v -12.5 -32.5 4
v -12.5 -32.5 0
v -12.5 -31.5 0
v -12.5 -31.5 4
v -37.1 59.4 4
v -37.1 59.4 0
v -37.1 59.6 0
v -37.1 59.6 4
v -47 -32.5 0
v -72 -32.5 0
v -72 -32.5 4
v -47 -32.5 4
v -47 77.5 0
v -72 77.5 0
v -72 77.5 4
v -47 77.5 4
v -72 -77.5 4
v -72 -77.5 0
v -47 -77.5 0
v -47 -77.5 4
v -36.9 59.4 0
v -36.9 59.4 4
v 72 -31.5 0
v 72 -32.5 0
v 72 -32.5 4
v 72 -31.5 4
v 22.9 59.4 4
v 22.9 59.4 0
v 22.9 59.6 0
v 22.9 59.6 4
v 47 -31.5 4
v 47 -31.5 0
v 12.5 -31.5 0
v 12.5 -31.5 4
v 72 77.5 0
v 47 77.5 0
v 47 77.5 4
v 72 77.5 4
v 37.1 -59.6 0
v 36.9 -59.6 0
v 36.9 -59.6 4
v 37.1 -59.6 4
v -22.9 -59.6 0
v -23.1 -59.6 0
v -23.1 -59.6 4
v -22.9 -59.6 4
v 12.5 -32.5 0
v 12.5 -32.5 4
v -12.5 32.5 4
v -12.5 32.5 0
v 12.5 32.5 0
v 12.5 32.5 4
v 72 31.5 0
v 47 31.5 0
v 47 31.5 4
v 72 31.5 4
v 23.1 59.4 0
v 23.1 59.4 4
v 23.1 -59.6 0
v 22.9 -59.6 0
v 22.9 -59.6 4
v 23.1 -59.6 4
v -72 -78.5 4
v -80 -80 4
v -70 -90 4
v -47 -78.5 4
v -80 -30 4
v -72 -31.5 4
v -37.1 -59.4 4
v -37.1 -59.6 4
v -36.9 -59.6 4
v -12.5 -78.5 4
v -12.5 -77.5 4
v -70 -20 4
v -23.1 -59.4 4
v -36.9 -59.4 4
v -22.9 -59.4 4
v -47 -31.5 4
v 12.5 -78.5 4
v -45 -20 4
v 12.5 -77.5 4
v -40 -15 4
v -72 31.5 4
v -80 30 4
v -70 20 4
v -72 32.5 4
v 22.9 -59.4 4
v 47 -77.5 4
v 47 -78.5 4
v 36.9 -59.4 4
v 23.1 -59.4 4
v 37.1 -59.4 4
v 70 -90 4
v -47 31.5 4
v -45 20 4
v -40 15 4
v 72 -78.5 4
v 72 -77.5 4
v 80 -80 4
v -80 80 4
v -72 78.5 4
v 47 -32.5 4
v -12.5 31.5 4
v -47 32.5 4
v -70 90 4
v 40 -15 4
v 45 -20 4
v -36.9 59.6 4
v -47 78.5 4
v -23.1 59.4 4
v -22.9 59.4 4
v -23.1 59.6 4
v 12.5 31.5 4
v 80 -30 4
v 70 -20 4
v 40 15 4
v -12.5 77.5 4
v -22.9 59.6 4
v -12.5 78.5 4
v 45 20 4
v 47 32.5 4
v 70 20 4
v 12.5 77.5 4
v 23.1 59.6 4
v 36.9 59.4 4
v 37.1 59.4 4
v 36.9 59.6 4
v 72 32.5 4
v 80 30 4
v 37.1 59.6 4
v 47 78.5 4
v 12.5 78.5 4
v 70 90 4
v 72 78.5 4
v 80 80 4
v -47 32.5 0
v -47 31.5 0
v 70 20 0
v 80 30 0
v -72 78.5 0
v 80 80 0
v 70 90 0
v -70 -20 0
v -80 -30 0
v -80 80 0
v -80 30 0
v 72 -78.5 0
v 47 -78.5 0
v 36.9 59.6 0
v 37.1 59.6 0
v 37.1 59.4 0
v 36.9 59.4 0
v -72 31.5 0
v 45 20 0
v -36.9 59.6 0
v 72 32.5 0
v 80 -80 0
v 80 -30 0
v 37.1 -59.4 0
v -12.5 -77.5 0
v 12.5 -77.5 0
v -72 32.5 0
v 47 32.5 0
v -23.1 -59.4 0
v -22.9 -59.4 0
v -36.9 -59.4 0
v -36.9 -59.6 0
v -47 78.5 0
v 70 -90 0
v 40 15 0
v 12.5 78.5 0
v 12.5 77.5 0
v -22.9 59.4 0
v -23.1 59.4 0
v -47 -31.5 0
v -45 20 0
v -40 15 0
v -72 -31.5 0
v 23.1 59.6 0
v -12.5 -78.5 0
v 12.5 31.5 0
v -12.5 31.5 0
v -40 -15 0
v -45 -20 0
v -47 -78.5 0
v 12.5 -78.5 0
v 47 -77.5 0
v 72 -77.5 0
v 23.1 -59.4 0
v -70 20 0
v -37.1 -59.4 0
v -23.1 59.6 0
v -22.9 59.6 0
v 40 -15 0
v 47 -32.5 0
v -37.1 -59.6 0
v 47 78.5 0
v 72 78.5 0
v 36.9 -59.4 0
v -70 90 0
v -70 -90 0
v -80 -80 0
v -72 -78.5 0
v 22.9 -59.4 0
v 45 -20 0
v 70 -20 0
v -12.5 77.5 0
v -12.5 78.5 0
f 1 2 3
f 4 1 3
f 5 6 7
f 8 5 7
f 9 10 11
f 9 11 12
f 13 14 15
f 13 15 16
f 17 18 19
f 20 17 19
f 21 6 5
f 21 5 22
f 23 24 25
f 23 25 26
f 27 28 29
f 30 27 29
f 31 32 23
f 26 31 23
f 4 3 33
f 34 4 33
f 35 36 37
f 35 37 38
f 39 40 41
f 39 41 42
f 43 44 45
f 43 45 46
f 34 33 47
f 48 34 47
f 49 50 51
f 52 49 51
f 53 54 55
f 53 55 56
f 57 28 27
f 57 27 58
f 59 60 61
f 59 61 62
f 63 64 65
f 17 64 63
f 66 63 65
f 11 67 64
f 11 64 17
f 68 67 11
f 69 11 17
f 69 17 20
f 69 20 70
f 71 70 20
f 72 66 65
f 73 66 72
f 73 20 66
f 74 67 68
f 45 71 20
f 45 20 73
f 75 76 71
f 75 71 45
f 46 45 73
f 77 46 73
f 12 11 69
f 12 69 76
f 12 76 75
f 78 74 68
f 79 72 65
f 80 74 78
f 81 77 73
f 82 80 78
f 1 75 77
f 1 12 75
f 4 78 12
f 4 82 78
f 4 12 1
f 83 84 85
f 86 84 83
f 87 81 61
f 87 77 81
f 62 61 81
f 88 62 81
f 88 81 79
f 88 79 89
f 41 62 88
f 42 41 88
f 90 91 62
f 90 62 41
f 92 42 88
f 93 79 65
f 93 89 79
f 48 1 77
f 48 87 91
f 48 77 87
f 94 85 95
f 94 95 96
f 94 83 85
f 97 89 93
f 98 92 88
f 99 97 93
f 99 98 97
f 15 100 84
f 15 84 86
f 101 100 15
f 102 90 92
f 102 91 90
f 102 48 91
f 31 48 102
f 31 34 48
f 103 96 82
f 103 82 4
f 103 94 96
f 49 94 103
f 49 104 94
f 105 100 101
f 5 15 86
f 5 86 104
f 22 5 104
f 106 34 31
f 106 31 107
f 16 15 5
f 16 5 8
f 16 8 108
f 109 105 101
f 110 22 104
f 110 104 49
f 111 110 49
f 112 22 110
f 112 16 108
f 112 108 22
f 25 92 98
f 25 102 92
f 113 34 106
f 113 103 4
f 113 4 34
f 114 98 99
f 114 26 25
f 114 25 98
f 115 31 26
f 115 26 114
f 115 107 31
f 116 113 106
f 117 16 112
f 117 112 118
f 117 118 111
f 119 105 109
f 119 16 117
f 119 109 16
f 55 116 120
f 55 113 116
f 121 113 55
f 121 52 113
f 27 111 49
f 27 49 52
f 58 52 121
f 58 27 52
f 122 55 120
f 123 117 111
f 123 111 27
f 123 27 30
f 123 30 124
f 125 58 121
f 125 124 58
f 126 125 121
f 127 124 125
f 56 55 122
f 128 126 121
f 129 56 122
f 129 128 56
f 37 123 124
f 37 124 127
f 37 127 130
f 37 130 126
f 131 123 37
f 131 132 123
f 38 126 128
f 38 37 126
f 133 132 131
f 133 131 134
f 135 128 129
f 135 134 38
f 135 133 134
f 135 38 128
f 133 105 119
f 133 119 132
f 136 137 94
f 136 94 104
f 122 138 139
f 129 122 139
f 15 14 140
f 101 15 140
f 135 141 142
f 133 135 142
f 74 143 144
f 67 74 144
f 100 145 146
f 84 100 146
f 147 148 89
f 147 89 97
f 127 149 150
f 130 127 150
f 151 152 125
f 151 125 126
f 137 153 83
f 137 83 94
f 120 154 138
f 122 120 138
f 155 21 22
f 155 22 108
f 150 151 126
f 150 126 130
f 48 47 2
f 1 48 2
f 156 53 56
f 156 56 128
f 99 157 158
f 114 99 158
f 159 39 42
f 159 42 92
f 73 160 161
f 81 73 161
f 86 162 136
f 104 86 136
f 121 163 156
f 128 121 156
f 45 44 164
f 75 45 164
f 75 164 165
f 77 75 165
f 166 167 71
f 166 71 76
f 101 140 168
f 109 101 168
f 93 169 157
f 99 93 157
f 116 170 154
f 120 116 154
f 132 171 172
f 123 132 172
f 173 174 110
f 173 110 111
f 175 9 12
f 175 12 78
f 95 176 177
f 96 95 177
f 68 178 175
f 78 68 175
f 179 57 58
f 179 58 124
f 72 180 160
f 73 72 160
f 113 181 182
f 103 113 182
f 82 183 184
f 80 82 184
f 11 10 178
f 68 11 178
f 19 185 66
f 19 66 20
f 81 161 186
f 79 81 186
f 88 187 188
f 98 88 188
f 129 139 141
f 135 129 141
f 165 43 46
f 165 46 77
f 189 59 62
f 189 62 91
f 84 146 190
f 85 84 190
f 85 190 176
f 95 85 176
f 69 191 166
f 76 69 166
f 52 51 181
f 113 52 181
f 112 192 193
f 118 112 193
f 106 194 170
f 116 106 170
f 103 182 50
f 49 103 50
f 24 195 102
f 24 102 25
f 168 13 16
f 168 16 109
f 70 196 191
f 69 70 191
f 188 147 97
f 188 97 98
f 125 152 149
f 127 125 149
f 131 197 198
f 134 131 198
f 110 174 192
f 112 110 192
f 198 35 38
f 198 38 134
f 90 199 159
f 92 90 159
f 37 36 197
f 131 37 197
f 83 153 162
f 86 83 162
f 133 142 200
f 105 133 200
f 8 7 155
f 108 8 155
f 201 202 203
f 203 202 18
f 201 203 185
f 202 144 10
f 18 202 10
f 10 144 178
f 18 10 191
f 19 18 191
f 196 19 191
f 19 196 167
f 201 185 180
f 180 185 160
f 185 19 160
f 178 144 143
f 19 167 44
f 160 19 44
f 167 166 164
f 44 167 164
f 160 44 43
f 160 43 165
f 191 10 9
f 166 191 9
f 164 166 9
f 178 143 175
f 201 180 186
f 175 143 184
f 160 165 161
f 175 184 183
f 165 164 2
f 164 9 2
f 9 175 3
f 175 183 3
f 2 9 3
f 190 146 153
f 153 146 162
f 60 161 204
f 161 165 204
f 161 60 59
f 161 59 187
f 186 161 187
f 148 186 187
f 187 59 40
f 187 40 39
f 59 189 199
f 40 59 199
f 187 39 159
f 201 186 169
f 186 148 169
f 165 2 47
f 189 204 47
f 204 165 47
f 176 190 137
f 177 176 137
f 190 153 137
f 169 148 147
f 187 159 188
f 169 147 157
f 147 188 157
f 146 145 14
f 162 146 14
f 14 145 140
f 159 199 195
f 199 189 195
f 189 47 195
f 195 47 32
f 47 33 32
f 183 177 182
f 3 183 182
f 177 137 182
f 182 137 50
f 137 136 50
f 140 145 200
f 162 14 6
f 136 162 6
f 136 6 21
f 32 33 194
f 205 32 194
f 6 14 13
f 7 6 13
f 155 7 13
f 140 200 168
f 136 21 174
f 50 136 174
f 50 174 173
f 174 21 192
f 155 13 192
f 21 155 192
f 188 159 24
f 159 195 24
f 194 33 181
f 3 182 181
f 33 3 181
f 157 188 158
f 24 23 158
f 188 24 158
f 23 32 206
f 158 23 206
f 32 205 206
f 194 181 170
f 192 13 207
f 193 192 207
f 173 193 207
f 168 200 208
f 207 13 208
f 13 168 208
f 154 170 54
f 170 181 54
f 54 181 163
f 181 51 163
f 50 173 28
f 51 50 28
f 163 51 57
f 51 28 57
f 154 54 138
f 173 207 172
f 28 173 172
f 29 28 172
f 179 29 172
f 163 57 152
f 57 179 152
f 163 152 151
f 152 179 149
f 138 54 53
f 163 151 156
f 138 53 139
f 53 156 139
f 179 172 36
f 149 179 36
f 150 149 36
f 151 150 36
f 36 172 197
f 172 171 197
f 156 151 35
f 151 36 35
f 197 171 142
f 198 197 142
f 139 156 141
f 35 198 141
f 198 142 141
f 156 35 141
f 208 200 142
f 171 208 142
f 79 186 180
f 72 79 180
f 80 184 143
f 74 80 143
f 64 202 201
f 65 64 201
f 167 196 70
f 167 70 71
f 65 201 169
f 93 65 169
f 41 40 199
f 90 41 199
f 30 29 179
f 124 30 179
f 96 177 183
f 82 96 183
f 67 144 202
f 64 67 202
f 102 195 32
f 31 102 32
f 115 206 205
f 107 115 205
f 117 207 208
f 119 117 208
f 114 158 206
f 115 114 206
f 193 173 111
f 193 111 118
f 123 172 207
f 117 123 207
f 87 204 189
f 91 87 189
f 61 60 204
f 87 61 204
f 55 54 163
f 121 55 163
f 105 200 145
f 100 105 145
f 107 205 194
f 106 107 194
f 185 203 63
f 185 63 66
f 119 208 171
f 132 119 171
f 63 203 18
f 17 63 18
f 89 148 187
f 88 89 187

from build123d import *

# Parameters (mm, degrees)
F0_W     = 25
F0_H     = 1
F0_W_2   = 0.2
F0_H_2   = 0.2
F1_DEPTH = 4


with BuildPart() as f1:
    # F0 (on Top) → F1 (new body)
    with BuildSketch(Plane.XY):
        Polygon((70, 90), (0, 90), (-70, 90), (-80, 80), (-80, 30), (-70, 20), (-45, 20), (-40, 15), (-40, 0), (-40, -15), (-45, -20), (-70, -20), (-80, -30), (-80, -80), (-70, -90), (0, -90), (70, -90), (80, -80), (80, -30), (70, -20), (45, -20), (40, -15), (40, 0), (40, 15), (45, 20), (70, 20), (80, 30), (80, 80), align=None)
        with Locations((-59.5, -78)):
            Rectangle(F0_W, F0_H, mode=Mode.SUBTRACT)
        with Locations((-37, -59.5)):
            Rectangle(F0_W_2, F0_H_2, mode=Mode.SUBTRACT)
        with Locations((-23, -59.5)):
            Rectangle(F0_W_2, F0_H_2, mode=Mode.SUBTRACT)
        with Locations((-59.5, -32)):
            Rectangle(F0_W, F0_H, mode=Mode.SUBTRACT)
        Polygon((12.5, -78.5), (0, -78.5), (-12.5, -78.5), (-12.5, -77.5), (0, -77.5), (12.5, -77.5), align=None, mode=Mode.SUBTRACT)
        with Locations((23, -59.5)):
            Rectangle(F0_W_2, F0_H_2, mode=Mode.SUBTRACT)
        with Locations((37, -59.5)):
            Rectangle(F0_W_2, F0_H_2, mode=Mode.SUBTRACT)
        with Locations((59.5, -78)):
            Rectangle(F0_W, F0_H, mode=Mode.SUBTRACT)
        Polygon((12.5, -32.5), (0, -32.5), (-12.5, -32.5), (-12.5, -31.5), (0, -31.5), (12.5, -31.5), align=None, mode=Mode.SUBTRACT)
        with Locations((59.5, -32)):
            Rectangle(F0_W, F0_H, mode=Mode.SUBTRACT)
        with Locations((-59.5, 32)):
            Rectangle(F0_W, F0_H, mode=Mode.SUBTRACT)
        with Locations((-59.5, 78)):
            Rectangle(F0_W, F0_H, mode=Mode.SUBTRACT)
        with Locations((-37, 59.5)):
            Rectangle(F0_W_2, F0_H_2, mode=Mode.SUBTRACT)
        with Locations((-23, 59.5)):
            Rectangle(F0_W_2, F0_H_2, mode=Mode.SUBTRACT)
        Polygon((12.5, 32.5), (12.5, 31.5), (0, 31.5), (-12.5, 31.5), (-12.5, 32.5), (0, 32.5), align=None, mode=Mode.SUBTRACT)
        with Locations((59.5, 32)):
            Rectangle(F0_W, F0_H, mode=Mode.SUBTRACT)
        with Locations((23, 59.5)):
            Rectangle(F0_W_2, F0_H_2, mode=Mode.SUBTRACT)
        with Locations((37, 59.5)):
            Rectangle(F0_W_2, F0_H_2, mode=Mode.SUBTRACT)
        Polygon((-12.5, 78.5), (0, 78.5), (12.5, 78.5), (12.5, 77.5), (0, 77.5), (-12.5, 77.5), align=None, mode=Mode.SUBTRACT)
        with Locations((59.5, 78)):
            Rectangle(F0_W, F0_H, mode=Mode.SUBTRACT)
    extrude(amount=F1_DEPTH)


solid = f1.part
